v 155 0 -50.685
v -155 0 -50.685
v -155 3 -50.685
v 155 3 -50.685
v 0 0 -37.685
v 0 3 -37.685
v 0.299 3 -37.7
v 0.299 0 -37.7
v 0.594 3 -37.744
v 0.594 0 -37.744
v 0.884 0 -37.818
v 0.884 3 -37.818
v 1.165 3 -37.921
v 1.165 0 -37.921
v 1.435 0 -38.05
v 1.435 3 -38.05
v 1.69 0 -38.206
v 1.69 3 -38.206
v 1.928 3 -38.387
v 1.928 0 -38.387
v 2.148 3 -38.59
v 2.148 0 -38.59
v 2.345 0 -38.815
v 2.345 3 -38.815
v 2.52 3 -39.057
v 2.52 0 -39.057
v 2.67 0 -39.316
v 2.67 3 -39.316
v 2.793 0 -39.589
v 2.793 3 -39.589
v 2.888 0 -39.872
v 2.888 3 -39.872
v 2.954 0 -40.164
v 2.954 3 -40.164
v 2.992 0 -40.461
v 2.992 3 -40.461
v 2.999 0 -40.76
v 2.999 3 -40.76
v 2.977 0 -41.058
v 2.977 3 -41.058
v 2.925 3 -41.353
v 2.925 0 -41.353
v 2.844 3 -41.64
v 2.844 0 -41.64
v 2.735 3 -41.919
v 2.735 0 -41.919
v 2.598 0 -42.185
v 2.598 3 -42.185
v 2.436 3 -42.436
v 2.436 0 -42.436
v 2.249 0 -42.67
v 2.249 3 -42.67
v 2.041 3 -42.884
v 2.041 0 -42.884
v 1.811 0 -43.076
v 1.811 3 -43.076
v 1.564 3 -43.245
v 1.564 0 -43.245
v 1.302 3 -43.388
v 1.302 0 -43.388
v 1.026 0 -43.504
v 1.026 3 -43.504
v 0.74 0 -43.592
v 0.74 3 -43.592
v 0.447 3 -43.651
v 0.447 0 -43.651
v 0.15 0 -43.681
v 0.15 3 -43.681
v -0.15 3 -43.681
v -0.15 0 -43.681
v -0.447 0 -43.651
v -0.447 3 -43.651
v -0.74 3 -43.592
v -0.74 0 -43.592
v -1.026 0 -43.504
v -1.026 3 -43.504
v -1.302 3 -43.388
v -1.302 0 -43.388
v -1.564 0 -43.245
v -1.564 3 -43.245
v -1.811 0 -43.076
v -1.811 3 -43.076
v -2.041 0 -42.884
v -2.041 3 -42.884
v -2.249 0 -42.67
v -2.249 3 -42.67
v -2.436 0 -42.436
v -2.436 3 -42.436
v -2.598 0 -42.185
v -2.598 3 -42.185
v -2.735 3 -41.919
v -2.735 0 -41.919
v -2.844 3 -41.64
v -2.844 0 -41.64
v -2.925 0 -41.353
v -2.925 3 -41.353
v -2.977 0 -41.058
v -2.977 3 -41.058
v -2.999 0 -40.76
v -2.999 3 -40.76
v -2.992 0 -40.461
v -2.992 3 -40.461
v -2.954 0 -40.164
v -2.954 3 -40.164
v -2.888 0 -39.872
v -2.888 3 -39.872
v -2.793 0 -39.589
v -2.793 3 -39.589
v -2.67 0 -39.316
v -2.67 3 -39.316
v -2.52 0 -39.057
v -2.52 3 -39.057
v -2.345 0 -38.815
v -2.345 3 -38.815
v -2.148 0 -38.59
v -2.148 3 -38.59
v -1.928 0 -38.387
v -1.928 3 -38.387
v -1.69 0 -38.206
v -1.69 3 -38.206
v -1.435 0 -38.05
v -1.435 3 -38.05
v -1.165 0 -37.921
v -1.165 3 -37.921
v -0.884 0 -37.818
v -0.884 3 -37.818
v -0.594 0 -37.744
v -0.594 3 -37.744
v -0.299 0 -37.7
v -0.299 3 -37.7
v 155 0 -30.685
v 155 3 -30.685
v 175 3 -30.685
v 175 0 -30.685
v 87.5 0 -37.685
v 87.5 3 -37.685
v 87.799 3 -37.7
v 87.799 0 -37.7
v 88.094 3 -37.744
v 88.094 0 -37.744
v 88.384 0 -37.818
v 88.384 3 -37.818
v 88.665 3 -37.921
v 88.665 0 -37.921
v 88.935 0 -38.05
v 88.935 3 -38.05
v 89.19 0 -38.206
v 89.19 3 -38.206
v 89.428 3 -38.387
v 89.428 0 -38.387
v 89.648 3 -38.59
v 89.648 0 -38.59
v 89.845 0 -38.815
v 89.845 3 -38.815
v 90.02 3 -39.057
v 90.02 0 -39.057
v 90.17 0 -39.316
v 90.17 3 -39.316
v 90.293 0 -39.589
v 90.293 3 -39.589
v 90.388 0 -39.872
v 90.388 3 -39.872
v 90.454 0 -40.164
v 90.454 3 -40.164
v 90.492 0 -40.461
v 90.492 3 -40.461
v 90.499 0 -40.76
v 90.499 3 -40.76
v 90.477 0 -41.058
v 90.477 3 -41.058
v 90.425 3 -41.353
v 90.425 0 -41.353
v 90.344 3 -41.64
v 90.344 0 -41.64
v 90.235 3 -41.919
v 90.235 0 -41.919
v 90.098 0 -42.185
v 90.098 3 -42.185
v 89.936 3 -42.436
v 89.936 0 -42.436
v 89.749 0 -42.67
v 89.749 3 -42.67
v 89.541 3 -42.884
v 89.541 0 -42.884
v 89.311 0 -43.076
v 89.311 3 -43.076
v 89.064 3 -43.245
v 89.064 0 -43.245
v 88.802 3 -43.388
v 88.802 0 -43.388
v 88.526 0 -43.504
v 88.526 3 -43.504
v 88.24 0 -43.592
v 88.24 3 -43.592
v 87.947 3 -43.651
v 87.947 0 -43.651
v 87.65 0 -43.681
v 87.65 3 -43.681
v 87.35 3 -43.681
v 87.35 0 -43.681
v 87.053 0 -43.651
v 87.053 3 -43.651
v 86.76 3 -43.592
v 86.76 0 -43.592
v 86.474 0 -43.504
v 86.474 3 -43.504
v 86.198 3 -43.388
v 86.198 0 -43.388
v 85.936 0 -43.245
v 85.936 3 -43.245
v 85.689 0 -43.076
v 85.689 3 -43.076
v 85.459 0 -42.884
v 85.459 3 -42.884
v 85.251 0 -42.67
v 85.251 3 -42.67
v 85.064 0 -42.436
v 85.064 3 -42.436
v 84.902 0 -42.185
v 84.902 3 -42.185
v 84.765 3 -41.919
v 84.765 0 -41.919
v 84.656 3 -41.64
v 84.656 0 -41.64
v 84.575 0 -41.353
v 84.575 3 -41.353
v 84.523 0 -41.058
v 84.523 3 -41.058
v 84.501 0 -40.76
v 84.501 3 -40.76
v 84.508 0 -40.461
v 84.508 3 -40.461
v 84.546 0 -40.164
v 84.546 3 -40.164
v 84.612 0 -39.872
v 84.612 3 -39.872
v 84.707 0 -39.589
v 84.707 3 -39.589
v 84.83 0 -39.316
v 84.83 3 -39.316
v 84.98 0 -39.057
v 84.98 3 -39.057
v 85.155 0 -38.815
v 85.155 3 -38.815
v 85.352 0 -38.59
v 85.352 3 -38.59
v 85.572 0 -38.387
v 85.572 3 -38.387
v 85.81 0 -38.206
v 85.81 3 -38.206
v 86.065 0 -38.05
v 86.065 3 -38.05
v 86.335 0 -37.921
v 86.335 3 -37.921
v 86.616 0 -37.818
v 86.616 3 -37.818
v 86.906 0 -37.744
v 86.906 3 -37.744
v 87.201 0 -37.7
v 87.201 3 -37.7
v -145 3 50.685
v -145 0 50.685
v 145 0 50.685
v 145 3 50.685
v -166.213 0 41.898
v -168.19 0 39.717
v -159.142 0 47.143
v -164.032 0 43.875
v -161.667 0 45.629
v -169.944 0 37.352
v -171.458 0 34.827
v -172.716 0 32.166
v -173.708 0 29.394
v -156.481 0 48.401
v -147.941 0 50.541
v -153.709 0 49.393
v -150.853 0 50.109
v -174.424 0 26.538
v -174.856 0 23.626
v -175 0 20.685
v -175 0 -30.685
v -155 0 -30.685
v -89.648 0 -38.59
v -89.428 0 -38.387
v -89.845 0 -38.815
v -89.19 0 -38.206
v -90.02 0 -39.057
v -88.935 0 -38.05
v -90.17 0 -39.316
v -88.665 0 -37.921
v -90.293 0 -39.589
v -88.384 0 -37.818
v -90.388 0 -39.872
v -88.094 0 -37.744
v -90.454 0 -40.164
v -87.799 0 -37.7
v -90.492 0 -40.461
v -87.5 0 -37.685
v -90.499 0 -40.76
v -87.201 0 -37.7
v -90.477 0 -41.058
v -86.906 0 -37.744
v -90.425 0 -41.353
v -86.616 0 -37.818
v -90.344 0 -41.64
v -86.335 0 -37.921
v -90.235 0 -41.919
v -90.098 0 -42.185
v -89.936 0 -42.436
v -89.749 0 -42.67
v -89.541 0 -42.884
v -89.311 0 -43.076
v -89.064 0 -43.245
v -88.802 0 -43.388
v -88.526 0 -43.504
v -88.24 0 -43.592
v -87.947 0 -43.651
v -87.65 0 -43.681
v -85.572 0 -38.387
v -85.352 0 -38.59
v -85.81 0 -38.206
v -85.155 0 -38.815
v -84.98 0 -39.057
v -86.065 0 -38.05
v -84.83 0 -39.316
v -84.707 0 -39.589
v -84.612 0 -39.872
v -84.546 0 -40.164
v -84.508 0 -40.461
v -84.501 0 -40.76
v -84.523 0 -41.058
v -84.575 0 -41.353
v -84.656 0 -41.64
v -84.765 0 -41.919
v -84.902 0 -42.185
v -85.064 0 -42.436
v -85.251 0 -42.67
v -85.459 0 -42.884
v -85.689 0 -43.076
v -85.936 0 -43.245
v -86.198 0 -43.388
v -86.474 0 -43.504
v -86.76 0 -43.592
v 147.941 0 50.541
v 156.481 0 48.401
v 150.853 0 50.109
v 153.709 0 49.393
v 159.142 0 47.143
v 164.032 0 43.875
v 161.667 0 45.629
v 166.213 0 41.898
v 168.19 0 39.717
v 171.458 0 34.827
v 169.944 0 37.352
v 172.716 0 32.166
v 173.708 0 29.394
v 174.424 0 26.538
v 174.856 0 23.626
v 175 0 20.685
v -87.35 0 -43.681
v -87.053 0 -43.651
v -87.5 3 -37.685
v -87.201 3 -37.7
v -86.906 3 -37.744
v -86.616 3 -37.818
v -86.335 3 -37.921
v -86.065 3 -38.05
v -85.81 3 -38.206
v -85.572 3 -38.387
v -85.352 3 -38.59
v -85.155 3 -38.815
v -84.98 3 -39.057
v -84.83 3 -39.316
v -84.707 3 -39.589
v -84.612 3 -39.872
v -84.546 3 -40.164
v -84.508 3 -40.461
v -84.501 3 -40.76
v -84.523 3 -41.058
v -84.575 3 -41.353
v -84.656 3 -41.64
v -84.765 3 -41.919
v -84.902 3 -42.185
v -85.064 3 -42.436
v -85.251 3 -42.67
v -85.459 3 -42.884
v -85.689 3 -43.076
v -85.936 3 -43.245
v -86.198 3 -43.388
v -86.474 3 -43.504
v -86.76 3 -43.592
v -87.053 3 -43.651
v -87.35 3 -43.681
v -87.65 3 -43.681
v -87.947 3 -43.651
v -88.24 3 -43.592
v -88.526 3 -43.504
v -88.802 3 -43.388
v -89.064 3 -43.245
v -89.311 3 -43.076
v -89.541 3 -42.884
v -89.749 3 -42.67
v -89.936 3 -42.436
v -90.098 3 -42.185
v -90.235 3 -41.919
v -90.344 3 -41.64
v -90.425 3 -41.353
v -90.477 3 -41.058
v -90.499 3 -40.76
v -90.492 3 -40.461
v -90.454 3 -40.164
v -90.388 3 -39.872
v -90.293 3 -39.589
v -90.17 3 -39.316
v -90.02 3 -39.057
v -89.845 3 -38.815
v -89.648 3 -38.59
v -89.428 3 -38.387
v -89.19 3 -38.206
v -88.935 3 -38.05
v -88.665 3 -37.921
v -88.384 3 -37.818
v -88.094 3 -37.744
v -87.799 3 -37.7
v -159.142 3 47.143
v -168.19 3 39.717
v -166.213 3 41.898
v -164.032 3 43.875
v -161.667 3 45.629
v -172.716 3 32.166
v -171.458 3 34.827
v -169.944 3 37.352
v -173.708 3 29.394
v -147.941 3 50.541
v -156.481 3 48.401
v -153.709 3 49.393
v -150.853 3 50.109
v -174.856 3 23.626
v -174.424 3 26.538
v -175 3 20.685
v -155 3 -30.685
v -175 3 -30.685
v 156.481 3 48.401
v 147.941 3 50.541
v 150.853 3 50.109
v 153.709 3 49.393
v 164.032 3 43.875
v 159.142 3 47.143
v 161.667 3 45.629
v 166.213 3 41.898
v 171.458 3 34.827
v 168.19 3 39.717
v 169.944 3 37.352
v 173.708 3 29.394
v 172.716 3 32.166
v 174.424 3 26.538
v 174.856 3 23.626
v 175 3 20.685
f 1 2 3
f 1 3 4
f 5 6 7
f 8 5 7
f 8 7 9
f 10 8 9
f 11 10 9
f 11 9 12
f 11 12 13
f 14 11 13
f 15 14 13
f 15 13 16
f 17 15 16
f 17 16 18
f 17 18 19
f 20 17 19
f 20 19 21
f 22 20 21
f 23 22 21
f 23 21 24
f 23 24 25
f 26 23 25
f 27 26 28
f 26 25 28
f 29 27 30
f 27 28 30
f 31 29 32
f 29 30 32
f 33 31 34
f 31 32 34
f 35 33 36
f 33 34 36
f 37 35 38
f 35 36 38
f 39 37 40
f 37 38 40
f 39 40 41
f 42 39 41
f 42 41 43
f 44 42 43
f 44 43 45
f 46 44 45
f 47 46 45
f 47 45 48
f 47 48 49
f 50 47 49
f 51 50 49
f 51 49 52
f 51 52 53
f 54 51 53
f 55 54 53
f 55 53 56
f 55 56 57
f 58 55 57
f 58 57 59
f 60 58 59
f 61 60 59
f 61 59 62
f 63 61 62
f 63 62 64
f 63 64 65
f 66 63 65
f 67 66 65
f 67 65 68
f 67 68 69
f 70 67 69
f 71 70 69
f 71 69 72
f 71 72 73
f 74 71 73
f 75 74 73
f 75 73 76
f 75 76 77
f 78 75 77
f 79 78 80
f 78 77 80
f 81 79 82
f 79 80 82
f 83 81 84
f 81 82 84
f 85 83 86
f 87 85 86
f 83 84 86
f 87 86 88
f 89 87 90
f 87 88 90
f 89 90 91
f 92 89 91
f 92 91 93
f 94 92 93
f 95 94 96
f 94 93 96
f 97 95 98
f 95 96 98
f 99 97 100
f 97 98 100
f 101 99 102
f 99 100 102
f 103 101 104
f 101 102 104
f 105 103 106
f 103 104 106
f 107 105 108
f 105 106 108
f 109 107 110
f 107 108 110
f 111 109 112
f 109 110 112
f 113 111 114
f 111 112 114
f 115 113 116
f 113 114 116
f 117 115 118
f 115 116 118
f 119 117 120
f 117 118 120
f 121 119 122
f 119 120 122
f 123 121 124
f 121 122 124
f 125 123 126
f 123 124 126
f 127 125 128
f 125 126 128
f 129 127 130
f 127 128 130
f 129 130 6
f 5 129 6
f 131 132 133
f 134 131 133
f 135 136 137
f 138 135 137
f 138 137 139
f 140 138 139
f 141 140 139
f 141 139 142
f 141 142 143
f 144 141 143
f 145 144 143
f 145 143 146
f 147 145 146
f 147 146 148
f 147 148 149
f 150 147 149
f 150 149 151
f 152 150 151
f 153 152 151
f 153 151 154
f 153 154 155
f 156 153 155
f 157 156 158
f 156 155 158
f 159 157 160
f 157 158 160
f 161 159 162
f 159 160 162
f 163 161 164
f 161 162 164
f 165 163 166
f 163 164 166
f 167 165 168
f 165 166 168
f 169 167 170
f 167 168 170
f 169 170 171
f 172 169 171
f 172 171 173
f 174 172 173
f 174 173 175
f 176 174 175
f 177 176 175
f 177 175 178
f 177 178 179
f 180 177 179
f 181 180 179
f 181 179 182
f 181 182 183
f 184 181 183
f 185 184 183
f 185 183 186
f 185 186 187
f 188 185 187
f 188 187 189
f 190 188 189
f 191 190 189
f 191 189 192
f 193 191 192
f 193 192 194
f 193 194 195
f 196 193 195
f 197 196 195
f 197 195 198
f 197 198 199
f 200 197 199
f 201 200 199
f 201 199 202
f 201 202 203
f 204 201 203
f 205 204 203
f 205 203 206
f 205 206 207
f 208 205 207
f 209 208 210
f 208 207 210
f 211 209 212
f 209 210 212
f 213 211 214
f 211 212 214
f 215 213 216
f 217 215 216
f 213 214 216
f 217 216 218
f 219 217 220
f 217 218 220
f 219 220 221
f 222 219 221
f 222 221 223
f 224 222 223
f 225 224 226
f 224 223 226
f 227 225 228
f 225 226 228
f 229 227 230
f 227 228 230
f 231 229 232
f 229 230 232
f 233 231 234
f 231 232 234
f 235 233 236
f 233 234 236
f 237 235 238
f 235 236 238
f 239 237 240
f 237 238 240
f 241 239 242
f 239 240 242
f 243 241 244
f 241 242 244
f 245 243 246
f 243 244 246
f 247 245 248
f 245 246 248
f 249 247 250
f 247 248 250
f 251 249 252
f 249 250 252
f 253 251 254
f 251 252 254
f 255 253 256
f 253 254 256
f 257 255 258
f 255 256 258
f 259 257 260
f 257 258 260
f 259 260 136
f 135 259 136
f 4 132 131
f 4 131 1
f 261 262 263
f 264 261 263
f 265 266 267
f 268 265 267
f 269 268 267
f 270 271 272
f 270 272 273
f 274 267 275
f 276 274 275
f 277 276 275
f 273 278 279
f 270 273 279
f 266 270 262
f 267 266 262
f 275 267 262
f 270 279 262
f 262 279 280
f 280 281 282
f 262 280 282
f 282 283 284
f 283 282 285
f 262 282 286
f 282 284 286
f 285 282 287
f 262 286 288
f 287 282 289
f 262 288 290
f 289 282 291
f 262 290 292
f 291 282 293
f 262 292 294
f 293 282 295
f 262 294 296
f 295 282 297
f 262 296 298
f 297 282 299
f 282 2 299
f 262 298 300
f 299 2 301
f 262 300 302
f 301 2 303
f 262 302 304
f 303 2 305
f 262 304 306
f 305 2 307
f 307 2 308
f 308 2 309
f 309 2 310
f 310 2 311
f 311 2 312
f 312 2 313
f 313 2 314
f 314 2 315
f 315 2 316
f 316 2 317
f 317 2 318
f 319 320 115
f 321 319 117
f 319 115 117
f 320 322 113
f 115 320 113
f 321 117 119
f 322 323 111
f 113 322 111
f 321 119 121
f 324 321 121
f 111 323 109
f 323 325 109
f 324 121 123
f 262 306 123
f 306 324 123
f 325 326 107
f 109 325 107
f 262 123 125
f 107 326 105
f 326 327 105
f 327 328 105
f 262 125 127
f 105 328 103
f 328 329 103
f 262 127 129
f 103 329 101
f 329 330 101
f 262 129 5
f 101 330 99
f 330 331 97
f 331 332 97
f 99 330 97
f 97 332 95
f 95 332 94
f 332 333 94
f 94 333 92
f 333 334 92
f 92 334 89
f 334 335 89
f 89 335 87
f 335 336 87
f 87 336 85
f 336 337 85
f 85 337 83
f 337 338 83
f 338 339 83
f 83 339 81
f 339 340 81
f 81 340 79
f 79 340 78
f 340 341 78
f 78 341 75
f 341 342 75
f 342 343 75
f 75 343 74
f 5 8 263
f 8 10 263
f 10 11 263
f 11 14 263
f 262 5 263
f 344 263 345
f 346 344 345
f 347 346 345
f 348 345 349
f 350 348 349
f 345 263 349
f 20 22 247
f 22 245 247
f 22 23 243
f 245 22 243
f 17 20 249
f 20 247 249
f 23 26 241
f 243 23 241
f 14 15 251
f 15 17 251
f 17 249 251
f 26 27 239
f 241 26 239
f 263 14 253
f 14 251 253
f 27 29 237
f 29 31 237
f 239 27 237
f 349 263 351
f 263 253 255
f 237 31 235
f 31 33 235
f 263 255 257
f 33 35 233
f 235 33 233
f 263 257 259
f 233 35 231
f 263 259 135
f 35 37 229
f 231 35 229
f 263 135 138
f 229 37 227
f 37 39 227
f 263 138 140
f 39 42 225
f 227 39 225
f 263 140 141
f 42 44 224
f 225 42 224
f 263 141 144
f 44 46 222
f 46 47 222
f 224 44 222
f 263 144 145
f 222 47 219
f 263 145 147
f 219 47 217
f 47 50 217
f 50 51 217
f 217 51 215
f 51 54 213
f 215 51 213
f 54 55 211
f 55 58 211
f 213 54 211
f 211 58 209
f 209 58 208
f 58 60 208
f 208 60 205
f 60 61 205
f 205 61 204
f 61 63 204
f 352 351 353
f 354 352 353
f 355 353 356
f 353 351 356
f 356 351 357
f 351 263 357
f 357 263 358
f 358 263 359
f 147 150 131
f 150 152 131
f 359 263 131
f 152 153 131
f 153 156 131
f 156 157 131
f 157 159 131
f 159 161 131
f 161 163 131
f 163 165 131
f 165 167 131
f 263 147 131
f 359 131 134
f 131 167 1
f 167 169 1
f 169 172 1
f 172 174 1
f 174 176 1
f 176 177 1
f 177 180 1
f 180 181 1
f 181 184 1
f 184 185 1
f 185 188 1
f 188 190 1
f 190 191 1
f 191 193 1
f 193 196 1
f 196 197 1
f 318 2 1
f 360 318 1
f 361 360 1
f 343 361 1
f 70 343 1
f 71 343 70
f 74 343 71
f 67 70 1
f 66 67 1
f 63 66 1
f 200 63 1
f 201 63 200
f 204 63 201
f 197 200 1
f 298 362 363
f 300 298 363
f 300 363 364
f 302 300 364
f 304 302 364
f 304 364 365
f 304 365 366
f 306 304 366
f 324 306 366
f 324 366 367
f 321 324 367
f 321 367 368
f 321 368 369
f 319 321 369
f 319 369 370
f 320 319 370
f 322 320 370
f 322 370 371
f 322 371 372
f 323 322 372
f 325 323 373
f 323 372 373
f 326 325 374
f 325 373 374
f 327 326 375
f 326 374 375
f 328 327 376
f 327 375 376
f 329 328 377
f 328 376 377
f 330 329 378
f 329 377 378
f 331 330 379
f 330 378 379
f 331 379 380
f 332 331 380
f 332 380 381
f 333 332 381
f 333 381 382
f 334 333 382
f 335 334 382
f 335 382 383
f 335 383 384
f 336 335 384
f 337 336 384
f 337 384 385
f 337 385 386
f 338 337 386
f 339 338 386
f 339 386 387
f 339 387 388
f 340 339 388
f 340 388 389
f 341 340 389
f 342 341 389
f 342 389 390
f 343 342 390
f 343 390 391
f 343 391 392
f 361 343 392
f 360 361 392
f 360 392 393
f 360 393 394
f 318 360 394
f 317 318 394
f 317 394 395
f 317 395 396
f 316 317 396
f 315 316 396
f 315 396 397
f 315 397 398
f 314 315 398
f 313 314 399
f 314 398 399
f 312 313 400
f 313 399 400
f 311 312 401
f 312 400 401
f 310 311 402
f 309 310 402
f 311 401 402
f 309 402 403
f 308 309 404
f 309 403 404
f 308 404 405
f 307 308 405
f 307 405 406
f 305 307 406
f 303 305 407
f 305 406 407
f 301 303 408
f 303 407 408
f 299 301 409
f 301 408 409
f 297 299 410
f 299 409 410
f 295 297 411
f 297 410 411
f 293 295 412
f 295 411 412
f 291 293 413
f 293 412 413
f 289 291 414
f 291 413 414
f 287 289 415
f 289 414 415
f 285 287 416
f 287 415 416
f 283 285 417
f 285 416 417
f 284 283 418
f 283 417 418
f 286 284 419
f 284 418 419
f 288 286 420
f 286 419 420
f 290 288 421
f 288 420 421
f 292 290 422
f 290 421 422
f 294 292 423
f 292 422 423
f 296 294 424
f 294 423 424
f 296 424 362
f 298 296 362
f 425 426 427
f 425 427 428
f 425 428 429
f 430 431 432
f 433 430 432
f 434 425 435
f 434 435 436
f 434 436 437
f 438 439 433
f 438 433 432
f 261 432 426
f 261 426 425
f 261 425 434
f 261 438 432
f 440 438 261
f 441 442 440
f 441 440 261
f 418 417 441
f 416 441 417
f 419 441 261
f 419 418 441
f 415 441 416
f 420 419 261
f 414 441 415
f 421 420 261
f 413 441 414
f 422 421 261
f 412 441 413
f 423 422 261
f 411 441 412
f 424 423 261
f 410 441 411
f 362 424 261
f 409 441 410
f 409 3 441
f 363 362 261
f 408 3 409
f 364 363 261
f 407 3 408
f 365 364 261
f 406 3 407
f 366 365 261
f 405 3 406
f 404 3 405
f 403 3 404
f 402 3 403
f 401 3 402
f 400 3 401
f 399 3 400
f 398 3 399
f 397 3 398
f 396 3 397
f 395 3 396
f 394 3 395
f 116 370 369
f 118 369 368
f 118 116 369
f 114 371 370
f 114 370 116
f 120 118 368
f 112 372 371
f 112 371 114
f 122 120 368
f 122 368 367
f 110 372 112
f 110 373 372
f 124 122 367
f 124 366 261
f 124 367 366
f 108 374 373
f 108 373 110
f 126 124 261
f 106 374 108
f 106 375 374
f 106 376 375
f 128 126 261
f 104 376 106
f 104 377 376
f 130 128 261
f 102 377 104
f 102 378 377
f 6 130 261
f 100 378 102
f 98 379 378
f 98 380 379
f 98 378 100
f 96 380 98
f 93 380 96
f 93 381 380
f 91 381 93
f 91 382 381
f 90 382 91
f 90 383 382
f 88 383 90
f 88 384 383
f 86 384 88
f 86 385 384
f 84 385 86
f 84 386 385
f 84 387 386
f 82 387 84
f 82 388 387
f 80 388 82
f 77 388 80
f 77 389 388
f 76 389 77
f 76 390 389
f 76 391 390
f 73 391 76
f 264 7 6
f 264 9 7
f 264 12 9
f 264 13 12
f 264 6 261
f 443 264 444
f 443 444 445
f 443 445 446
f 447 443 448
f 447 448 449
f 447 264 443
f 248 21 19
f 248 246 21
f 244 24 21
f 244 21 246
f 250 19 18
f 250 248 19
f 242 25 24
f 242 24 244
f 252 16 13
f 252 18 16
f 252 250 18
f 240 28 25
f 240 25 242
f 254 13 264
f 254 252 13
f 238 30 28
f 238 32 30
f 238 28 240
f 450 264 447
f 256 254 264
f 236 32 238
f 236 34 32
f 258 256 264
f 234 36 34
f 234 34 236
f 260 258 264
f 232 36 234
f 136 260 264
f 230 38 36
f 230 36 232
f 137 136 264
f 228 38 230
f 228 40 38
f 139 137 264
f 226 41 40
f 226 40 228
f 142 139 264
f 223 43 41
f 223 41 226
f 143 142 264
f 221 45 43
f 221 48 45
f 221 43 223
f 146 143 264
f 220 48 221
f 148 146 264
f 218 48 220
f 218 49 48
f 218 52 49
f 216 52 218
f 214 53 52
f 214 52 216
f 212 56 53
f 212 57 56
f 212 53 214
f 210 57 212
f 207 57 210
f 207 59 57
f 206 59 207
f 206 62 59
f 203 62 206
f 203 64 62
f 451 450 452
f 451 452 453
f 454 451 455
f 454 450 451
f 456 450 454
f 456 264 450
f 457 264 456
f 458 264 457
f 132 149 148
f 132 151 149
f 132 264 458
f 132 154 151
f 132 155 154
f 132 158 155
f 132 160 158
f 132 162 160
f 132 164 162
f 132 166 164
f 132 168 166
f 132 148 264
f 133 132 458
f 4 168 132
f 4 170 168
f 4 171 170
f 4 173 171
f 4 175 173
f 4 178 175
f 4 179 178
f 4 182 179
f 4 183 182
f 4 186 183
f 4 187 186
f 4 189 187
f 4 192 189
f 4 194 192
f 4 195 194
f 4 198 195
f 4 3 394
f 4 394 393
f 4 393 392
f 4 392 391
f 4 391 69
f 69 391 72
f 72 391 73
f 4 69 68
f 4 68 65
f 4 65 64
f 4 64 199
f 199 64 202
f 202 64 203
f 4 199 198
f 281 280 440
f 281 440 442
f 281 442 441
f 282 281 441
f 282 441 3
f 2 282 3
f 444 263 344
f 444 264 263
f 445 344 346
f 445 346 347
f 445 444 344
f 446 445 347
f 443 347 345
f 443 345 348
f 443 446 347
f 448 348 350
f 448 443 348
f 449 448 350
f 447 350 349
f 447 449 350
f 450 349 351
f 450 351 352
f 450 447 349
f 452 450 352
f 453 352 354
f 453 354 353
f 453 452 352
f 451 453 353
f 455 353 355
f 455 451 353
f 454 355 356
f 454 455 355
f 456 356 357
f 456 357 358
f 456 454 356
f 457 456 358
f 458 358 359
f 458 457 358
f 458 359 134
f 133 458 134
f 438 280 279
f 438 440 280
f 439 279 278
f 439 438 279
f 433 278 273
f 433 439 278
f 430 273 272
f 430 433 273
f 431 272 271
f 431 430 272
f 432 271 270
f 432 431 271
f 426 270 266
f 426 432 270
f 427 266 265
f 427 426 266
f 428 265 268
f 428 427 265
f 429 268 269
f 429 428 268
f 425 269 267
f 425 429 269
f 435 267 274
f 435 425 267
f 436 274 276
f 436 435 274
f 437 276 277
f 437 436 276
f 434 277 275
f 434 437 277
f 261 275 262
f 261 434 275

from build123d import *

# Parameters (mm, degrees)
SKETCH_1_W          = 350
SKETCH_1_H          = 101.37
EXTRUDE_1_DEPTH     = 3
SKETCH_2_R          = 3
SKETCH_2_W          = 20
SKETCH_2_H          = 20
CUT_EXTRUDE_1_DEPTH = 183.21681927
FILLET_1_R          = 30


with BuildPart() as part:
    # 草圖1 → 填料-伸長1 (new body)
    with BuildSketch(Plane(origin=(0, 0, 0), x_dir=(1, 0, 0), z_dir=(0, 1, 0))):
        Rectangle(SKETCH_1_W, SKETCH_1_H)
    extrude(amount=EXTRUDE_1_DEPTH)

    # 草圖2 → 除料-伸長1 (cut, through all)
    with BuildSketch(Plane(origin=(0, 3, 0), x_dir=(1, 0, 0), z_dir=(0, 1, 0))):
        with Locations(Location((-87.5, 40.685, 0), (0, 0, 270))):
            Circle(SKETCH_2_R)
        with Locations(Location((0, 40.685, 0), (0, 0, 270))):
            Circle(SKETCH_2_R)
        with Locations(Location((87.5, 40.685, 0), (0, 0, 270))):
            Circle(SKETCH_2_R)
        with Locations((-165, 40.685)):
            Rectangle(SKETCH_2_W, SKETCH_2_H)
        with Locations((165, 40.685)):
            Rectangle(SKETCH_2_W, SKETCH_2_H)
    extrude(amount=-CUT_EXTRUDE_1_DEPTH, mode=Mode.SUBTRACT)

    # 圓角1
    fillet_1_edges = [part.edges().sort_by_distance(p)[0] for p in [
        (175, 1.5, 50.685),
        (-175, 1.5, 50.685),
    ]]
    fillet(fillet_1_edges, radius=FILLET_1_R)


solid = part.part
